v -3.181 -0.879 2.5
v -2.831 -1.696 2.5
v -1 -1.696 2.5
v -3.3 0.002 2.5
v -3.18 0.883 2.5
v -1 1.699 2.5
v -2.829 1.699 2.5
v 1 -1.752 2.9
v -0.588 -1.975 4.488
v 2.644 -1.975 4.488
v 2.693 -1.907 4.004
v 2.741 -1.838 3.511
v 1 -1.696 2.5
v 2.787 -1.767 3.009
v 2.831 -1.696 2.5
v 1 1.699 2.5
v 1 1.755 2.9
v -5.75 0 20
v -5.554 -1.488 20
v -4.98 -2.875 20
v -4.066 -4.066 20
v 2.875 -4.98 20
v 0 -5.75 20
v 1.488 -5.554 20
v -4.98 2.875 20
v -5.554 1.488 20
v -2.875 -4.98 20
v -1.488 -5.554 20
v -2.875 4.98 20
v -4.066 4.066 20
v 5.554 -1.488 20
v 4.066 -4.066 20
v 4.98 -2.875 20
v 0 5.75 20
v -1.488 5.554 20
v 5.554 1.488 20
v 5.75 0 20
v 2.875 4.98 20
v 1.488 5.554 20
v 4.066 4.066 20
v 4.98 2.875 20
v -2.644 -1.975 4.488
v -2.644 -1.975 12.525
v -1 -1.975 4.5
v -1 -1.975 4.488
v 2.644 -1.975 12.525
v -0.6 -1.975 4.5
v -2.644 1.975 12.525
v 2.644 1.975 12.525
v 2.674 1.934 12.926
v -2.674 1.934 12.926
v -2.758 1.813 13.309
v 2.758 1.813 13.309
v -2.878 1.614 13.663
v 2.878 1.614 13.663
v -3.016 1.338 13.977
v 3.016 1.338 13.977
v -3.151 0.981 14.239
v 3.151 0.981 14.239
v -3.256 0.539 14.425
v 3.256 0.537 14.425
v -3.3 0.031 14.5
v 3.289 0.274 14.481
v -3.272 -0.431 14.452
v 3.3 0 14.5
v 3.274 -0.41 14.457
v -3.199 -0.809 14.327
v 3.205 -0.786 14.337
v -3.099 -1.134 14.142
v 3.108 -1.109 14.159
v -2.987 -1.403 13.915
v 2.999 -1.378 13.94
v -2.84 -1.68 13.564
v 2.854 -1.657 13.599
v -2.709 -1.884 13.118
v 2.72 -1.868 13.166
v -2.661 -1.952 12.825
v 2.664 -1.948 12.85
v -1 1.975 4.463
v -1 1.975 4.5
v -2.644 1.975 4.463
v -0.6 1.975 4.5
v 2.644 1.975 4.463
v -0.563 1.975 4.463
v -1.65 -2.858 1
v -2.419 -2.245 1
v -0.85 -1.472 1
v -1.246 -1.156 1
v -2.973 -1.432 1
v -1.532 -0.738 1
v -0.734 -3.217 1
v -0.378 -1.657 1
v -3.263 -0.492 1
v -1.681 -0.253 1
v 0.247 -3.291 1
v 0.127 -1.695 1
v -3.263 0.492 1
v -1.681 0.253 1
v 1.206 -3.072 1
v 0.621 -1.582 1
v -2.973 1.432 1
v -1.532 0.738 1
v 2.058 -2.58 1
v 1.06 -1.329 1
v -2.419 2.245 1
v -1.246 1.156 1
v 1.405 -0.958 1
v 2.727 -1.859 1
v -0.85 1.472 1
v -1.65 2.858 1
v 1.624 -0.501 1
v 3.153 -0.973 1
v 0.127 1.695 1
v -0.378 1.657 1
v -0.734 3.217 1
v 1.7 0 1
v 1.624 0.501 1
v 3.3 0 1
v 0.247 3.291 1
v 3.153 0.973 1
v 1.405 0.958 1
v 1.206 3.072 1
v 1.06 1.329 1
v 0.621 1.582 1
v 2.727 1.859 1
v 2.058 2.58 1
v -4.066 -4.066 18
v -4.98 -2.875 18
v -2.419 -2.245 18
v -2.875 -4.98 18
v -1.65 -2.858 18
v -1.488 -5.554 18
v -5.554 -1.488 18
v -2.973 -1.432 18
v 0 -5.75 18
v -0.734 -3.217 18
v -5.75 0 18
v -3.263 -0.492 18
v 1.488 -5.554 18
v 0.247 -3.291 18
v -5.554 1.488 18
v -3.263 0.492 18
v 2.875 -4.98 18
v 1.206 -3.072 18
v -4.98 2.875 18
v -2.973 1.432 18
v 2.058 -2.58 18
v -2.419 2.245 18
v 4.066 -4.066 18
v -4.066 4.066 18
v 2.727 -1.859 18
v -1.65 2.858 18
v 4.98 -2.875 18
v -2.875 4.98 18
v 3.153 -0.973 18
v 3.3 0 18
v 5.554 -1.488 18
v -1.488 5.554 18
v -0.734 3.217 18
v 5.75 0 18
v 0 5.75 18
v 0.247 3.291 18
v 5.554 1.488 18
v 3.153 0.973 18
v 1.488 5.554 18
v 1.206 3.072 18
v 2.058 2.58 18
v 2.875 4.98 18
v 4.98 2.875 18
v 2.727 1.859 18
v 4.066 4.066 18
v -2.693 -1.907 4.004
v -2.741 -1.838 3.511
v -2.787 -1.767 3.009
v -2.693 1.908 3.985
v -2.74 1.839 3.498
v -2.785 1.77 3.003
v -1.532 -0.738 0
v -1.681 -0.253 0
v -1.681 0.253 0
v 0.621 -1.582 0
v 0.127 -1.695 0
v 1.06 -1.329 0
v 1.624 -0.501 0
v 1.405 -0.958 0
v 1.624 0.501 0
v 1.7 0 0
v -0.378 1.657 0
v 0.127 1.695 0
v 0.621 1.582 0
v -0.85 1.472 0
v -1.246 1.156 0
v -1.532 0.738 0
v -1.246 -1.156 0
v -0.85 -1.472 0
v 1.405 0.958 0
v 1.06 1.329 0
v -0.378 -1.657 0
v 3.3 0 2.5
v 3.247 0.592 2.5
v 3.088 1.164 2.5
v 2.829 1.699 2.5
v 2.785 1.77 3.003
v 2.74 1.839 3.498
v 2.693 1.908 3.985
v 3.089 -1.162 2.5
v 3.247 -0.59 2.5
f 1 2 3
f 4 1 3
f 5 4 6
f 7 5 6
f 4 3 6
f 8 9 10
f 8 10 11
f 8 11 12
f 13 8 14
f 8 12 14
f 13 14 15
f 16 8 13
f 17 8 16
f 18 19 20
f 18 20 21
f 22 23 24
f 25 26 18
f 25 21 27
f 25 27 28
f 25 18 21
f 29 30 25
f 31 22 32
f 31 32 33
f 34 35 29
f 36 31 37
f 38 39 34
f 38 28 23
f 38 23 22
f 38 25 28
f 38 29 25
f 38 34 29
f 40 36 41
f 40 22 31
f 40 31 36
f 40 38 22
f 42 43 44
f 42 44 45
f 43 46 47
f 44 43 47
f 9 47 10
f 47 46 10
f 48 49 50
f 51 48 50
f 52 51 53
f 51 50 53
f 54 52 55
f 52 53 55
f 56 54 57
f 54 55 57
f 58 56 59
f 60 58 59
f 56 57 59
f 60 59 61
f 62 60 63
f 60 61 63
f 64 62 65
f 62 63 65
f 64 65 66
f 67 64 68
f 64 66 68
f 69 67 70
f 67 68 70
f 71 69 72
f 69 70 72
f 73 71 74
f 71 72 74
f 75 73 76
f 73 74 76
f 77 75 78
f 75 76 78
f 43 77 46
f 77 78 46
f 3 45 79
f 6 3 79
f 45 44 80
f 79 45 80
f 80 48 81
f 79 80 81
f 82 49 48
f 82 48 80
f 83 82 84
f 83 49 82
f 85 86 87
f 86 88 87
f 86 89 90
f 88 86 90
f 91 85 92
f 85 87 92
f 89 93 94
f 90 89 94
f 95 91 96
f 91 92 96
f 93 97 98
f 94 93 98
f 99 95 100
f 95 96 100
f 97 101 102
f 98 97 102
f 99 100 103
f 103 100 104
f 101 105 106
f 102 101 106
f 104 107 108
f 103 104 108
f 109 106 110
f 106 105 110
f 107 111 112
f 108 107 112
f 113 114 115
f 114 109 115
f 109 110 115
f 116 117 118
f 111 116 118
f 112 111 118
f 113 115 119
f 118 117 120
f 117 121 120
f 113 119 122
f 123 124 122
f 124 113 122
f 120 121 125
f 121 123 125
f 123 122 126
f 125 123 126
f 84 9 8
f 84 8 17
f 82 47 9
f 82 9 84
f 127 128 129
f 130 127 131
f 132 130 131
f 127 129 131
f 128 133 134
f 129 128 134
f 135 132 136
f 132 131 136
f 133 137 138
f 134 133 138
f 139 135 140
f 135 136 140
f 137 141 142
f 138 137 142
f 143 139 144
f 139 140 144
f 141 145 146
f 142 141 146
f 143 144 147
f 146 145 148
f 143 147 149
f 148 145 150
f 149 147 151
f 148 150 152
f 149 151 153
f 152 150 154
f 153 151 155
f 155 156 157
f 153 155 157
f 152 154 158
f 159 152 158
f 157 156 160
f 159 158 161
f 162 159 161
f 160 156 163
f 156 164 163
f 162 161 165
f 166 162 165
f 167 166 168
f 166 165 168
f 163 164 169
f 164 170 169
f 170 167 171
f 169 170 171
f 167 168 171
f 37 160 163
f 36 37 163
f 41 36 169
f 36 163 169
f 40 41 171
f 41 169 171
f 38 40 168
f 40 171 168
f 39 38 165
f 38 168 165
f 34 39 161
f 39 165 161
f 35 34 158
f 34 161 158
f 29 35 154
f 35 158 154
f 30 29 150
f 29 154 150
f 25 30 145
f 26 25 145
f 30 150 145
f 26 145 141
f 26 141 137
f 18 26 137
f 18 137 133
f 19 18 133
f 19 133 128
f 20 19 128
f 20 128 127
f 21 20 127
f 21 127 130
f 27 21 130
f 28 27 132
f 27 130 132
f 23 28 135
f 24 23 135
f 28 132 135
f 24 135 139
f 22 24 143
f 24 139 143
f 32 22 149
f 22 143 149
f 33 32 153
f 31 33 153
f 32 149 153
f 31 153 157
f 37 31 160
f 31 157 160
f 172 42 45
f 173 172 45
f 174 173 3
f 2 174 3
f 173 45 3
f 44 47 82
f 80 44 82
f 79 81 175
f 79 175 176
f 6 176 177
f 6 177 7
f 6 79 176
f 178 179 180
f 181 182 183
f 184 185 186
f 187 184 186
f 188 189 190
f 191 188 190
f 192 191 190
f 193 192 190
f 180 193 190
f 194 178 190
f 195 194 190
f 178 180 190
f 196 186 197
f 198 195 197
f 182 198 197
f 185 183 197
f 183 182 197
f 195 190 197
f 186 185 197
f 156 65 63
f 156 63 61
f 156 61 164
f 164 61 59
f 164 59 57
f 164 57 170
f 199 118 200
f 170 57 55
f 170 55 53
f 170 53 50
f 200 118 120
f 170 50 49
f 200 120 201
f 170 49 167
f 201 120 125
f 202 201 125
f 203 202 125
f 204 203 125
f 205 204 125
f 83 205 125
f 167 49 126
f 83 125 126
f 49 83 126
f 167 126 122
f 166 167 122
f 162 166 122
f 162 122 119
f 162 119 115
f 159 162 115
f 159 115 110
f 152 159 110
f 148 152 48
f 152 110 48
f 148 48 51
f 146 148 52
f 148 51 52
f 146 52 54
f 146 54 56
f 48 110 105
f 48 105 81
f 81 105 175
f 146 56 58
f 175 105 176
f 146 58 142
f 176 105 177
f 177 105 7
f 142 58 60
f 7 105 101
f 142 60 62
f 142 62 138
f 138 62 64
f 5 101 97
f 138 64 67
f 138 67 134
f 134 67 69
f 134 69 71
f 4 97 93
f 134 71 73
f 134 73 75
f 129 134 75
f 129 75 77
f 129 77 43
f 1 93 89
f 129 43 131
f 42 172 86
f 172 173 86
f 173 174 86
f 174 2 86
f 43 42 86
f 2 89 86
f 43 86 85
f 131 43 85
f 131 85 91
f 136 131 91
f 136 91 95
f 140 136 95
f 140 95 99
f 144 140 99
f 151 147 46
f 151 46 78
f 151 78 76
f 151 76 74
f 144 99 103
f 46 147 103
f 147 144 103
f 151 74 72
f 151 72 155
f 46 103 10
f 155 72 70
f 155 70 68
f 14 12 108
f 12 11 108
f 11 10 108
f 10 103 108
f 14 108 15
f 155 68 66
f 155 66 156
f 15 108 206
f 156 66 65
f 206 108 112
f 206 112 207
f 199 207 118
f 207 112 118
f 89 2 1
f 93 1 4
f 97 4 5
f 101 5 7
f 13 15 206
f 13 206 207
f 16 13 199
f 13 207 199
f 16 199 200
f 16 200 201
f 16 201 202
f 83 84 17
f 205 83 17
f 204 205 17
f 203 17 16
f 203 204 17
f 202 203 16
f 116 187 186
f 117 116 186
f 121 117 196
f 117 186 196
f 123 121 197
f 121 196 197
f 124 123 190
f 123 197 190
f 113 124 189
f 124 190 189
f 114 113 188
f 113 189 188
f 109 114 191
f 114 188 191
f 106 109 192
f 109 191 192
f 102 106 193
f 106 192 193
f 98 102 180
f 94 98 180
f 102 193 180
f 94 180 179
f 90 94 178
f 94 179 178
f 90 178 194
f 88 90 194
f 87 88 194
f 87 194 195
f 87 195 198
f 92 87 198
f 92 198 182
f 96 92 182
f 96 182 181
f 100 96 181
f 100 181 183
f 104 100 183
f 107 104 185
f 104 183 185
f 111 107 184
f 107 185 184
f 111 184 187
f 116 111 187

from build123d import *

# Parameters (mm, degrees)
SKETCH006_W      = 5.741076
SKETCH006_H      = 2
EXTRUDE004_DEPTH = 1
CHAMFER_SIZE     = 1.6
EXTRUDE003_DEPTH = 7.5
SKETCH001_R      = 3.3
EXTRUDE001_DEPTH = 17
SKETCH002_R      = 5.75
EXTRUDE002_DEPTH = 2
SKETCH_R         = 1.7
EXTRUDE_DEPTH    = 1


with BuildPart() as chamfer_body:
    # Sketch006 → Extrude004 (new body, symmetric)
    with BuildSketch(Plane.YZ):
        with Locations((0, 3.5)):
            Rectangle(SKETCH006_W, SKETCH006_H)
    extrude(amount=EXTRUDE004_DEPTH, both=True)

    # Chamfer
    chamfer_edges = [chamfer_body.edges().sort_by_distance(p)[0] for p in [
        (1, 0, 4.5),
    ]]
    chamfer(chamfer_edges, length=CHAMFER_SIZE)


with BuildPart() as hole_e:
    # Sketch003 → Extrude003 (new body, symmetric)
    with BuildSketch(Plane.YZ):
        with BuildLine():
            Line((-1.975, 8.5), (-1.975, 4.487526))
            Line((-1.975, 4.487526), (-1.695672, 2.5))
            Line((-1.695672, 2.5), (0.001755, 2.5))
            Line((0.001755, 2.5), (1.699181, 2.5))
            Line((1.975, 4.462553), (1.699181, 2.5))
            Line((1.975, 8.5), (1.975, 4.462553))
            Line((1.975, 12.525), (1.975, 8.5))
            ThreePointArc((1.975, 12.525), (0, 14.5), (-1.975, 12.525))
            Line((-1.975, 12.525), (-1.975, 8.5))
        make_face()
    extrude(amount=EXTRUDE003_DEPTH, both=True)


with BuildPart() as slice2_e:
    # Sketch001 → Extrude001 (new body)
    with BuildSketch(Plane.XY.offset(1)):
        Circle(SKETCH001_R)
    extrude(amount=EXTRUDE001_DEPTH)


with BuildPart() as slice3_e:
    # Sketch002 → Extrude002 (new body)
    with BuildSketch(Plane.XY.offset(18)):
        Circle(SKETCH002_R)
    extrude(amount=EXTRUDE002_DEPTH)


with BuildPart() as everything:
    # Sketch → Extrude (new body)
    with BuildSketch(Plane.XY):
        Circle(SKETCH_R)
    extrude(amount=EXTRUDE_DEPTH)

    # Fusion: union slice2_e, slice3_e
    add(slice2_e.part)
    add(slice3_e.part)

    # Cut: cut hole_e
    add(hole_e.part, mode=Mode.SUBTRACT)

    # Fusion001: union Chamfer body
    add(chamfer_body.part)


solid = everything.part
